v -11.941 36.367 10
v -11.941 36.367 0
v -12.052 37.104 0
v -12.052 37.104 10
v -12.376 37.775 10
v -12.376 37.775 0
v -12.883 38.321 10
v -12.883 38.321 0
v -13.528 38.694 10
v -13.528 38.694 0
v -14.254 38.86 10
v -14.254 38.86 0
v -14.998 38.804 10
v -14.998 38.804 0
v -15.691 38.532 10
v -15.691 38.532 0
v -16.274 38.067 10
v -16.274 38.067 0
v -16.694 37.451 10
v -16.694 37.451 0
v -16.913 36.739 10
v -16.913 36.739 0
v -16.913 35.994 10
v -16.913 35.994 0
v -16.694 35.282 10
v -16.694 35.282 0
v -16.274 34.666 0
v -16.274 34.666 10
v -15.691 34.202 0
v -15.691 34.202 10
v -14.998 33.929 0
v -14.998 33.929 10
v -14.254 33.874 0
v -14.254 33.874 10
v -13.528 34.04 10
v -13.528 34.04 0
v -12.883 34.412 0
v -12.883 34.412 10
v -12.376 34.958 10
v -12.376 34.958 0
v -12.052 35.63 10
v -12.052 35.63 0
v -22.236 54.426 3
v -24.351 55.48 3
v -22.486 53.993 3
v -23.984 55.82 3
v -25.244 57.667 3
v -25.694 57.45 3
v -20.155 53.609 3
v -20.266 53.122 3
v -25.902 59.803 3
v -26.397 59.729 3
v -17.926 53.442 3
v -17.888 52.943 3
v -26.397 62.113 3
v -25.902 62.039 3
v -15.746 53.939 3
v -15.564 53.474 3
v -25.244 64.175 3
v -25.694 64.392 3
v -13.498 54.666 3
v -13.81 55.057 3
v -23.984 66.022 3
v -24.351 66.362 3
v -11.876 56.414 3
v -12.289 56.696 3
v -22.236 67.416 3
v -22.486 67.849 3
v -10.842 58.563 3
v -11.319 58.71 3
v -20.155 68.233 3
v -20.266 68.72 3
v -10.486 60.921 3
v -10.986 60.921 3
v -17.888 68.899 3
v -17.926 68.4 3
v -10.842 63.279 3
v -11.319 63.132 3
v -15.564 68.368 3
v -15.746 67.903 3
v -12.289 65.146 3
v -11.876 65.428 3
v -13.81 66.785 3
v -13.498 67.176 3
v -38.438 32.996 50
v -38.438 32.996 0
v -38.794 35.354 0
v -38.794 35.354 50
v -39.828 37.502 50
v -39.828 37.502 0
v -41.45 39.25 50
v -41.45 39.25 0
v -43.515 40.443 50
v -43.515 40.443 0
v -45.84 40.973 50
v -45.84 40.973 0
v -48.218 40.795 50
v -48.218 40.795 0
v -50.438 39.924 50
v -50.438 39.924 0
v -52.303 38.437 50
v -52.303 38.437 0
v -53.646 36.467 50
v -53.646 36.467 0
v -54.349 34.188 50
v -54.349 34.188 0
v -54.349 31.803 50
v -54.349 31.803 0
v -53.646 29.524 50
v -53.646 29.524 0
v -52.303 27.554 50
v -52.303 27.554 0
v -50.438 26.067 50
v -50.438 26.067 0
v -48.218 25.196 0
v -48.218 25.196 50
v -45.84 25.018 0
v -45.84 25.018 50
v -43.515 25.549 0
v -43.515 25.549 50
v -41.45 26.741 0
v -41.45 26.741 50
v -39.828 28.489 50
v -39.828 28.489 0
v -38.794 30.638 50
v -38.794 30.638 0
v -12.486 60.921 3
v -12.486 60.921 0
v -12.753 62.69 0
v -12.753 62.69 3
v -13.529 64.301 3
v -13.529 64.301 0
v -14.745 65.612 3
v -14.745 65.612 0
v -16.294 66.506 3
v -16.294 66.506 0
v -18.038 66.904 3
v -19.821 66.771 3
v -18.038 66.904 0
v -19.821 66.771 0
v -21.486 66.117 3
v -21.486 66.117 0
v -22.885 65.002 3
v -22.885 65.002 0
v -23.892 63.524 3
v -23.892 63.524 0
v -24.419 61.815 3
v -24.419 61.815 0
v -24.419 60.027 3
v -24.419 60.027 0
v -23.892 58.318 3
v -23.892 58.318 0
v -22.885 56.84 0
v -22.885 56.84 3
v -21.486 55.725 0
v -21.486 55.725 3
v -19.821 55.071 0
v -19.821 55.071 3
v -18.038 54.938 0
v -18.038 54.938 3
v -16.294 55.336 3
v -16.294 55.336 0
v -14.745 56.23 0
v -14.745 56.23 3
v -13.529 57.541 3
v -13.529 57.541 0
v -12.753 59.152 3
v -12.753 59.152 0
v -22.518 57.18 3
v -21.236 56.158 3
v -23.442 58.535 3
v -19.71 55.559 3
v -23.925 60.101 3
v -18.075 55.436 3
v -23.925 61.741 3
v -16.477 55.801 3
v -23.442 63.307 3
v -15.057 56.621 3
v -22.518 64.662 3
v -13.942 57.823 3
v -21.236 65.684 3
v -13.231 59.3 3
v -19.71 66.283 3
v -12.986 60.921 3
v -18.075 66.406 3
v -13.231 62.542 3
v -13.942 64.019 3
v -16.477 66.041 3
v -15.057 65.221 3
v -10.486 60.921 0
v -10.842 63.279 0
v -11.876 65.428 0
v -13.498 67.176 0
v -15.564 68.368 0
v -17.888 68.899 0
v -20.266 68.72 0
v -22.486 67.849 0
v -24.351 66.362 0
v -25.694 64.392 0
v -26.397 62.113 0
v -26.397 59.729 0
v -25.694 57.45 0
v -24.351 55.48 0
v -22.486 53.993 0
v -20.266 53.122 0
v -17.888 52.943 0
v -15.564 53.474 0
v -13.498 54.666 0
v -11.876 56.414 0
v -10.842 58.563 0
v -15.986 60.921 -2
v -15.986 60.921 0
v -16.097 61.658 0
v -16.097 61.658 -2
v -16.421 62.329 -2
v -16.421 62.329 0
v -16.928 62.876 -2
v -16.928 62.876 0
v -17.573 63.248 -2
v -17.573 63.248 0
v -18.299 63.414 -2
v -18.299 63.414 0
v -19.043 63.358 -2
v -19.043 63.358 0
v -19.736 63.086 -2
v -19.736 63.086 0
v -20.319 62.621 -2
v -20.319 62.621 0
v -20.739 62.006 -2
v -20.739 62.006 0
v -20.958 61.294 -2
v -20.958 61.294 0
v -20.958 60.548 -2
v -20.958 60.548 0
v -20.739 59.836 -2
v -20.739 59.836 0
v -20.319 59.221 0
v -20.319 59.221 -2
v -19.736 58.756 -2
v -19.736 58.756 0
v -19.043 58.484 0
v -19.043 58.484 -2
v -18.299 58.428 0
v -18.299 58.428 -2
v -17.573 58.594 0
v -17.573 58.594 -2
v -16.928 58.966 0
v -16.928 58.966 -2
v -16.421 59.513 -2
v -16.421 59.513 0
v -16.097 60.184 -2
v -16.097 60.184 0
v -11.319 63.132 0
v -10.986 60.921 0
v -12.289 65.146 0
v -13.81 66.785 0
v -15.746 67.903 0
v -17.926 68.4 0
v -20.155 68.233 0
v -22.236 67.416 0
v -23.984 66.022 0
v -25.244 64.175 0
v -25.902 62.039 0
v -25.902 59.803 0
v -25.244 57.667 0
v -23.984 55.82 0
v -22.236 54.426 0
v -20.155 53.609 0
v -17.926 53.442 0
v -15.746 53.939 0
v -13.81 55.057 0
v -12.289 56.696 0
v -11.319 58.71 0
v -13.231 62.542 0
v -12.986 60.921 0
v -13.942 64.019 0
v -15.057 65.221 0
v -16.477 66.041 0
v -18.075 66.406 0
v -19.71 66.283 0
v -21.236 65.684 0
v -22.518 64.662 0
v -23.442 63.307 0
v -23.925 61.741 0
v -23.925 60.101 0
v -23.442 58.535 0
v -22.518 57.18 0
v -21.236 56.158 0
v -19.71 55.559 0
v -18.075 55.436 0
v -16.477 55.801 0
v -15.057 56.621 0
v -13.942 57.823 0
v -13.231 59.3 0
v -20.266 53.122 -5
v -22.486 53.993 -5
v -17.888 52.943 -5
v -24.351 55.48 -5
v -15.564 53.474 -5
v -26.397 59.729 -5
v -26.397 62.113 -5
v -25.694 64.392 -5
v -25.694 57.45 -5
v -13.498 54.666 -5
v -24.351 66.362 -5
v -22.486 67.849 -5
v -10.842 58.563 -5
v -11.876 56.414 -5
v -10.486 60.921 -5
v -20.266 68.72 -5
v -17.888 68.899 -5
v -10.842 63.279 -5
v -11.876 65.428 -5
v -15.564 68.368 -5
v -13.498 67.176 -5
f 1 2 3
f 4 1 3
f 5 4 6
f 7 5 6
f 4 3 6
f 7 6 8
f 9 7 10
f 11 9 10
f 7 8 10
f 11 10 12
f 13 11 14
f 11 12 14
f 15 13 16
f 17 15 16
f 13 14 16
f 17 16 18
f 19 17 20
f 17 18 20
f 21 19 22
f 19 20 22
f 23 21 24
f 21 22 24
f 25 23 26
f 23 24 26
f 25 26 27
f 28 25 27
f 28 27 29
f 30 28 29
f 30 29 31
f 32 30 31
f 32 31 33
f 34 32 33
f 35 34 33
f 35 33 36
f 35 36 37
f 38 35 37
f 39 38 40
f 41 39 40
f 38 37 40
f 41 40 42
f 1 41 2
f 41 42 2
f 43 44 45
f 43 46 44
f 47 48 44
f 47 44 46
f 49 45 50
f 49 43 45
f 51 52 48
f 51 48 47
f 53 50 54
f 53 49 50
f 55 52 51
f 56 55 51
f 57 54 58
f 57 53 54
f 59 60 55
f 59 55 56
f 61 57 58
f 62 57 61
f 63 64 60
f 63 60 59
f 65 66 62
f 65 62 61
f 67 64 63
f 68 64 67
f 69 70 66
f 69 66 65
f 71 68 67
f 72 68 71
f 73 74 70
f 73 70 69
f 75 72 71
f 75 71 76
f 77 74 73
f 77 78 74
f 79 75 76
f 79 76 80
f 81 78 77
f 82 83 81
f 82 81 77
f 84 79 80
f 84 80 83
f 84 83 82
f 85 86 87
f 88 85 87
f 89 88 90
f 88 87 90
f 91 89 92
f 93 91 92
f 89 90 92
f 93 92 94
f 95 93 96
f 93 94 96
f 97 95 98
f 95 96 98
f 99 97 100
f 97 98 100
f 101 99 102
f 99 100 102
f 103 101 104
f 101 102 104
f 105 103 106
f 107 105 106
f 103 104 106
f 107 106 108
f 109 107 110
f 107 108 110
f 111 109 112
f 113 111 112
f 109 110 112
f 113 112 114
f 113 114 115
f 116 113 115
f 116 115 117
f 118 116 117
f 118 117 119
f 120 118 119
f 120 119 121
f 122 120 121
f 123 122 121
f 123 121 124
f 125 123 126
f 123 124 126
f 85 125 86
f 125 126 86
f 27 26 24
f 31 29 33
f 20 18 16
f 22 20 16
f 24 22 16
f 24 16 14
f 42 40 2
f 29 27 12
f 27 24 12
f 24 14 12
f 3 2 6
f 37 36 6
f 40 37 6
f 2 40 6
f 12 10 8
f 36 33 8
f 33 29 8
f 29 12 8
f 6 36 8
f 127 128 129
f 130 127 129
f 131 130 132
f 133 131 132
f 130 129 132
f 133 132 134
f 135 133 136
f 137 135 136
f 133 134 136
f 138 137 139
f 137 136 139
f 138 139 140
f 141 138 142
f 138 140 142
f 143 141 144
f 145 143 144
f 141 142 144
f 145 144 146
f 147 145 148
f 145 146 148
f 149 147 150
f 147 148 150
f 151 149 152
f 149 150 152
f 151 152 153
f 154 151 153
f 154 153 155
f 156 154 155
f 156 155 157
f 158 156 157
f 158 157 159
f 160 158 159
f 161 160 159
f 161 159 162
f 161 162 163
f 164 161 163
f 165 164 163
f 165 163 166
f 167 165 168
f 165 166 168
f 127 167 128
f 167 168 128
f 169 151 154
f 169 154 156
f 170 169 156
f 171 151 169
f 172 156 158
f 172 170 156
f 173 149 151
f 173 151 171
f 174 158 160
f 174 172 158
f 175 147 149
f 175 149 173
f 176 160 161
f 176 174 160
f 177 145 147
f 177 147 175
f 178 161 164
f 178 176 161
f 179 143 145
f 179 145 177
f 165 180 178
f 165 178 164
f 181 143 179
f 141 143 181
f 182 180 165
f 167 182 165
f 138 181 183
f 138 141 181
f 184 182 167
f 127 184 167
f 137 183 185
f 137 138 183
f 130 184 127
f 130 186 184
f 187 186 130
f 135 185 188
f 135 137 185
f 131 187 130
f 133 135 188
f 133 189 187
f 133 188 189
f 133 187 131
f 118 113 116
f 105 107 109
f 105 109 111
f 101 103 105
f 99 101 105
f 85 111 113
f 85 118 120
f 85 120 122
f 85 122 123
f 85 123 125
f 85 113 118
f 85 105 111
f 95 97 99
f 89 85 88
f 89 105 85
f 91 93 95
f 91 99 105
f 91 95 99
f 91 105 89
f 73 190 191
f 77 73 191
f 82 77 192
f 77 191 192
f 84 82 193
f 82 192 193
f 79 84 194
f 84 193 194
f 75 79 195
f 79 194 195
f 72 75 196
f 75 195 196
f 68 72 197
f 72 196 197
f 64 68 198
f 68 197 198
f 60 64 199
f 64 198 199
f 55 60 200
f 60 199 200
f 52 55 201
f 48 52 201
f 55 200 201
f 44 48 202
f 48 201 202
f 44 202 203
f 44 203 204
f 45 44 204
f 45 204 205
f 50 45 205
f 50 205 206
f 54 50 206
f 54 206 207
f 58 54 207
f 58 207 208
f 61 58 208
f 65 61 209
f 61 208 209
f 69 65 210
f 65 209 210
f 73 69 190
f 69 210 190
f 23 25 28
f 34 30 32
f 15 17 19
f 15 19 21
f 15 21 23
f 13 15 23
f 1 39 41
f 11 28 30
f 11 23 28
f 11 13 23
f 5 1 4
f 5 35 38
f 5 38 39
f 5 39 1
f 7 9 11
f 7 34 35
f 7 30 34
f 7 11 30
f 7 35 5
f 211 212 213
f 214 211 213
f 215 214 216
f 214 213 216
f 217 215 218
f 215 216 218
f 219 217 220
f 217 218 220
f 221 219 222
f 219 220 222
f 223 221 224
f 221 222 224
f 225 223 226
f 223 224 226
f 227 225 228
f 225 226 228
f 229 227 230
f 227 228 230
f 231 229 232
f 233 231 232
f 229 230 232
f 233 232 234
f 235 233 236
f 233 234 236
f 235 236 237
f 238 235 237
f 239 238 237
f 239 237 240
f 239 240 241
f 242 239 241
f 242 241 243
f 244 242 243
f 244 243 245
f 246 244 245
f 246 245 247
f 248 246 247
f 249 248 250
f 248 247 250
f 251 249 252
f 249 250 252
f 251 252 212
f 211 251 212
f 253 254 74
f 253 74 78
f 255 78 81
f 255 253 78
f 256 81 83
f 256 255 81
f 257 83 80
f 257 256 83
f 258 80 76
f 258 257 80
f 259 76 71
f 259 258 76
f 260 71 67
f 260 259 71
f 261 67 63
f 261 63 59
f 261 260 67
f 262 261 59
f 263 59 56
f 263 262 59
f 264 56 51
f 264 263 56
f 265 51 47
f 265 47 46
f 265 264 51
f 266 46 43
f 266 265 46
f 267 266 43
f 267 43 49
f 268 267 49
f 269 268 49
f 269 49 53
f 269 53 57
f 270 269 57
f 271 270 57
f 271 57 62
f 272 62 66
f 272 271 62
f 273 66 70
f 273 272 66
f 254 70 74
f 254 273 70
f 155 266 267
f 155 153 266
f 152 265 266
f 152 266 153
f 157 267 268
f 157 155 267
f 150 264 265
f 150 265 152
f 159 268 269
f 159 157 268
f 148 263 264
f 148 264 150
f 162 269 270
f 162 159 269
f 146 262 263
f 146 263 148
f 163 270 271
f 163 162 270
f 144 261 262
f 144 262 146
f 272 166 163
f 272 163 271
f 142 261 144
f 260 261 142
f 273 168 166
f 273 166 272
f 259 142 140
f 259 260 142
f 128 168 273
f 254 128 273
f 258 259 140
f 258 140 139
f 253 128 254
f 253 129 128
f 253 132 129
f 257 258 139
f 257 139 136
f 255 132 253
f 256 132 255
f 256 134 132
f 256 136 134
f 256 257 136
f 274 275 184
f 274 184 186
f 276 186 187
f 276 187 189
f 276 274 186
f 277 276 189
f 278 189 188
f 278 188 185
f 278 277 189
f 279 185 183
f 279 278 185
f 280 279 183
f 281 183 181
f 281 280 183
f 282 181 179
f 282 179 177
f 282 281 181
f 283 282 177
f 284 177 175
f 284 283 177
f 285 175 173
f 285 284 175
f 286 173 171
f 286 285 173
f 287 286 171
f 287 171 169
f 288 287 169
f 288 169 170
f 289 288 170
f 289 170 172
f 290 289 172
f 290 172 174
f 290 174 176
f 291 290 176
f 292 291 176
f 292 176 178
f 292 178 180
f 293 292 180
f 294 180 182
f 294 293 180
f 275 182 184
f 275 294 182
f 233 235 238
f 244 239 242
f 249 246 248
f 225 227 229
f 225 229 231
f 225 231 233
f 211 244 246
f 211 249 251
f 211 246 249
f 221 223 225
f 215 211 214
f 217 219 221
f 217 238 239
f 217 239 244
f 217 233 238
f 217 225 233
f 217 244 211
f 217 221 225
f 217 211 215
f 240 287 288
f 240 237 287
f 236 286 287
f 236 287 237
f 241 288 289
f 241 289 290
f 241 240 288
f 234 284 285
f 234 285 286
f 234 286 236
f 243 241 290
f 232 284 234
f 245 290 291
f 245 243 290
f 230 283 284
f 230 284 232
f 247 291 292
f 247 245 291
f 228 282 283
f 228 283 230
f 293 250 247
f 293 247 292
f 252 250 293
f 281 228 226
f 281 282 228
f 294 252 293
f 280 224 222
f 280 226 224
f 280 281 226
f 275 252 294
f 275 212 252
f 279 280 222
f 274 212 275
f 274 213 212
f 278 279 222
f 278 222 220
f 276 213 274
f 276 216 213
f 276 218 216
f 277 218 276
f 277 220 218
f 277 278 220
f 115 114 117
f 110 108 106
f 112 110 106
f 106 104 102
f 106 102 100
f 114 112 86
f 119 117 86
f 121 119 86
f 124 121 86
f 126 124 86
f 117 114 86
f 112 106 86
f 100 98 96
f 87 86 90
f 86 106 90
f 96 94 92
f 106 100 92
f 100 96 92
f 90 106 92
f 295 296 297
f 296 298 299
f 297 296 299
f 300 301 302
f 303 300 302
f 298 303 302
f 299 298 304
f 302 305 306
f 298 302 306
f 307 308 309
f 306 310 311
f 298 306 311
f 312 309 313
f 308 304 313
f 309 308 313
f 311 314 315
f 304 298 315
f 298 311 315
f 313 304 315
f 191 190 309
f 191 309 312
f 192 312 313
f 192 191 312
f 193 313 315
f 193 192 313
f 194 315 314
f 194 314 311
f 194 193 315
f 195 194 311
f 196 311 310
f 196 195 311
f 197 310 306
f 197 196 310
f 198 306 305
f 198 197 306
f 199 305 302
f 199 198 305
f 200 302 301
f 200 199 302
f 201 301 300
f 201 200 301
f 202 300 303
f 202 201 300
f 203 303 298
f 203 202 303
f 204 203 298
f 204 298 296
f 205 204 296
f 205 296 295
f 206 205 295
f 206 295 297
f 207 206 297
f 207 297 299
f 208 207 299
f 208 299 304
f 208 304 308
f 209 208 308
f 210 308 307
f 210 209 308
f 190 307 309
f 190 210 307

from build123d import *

# Parameters (mm, degrees)
F0_R     = 8
F1_DEPTH = 50
F2_R     = 8
F2_R_2   = 7.5
F2_R_3   = 6
F2_R_4   = 5.5
F2_R_5   = 2.5
F3_DEPTH = 5
F4_DEPTH = 3
F5_DEPTH = 2
F6_R     = 2.5
F7_DEPTH = 10


with BuildPart() as f1:
    # F0 (on Top) → F1 (new body)
    with BuildSketch(Plane.XY):
        with Locations((-46.4382022619, 32.9955667257)):
            Circle(F0_R)
    extrude(amount=F1_DEPTH)


with BuildPart() as f3:
    # F2 (on Top) → F3 (new body)
    with BuildSketch(Plane.XY):
        with Locations((-18.4862352908, 60.9209723771)):
            Circle(F2_R)
        with Locations((-18.4862352908, 60.9209723771)):
            Circle(F2_R_2, mode=Mode.SUBTRACT)
        with Locations((-18.4862352908, 60.9209723771)):
            Circle(F2_R_2)
        with Locations((-18.4862352908, 60.9209723771)):
            Circle(F2_R_3, mode=Mode.SUBTRACT)
        with Locations((-18.4862352908, 60.9209723771)):
            Circle(F2_R_3)
        with Locations((-18.4862352908, 60.9209723771)):
            Circle(F2_R_4, mode=Mode.SUBTRACT)
        with Locations((-18.4862352908, 60.9209723771)):
            Circle(F2_R_4)
        with Locations((-18.4862352908, 60.9209723771)):
            Circle(F2_R_5, mode=Mode.SUBTRACT)
        with Locations((-18.4862352908, 60.9209723771)):
            Circle(F2_R_5)
    extrude(amount=-F3_DEPTH)

    # F2 (on Top) → F4 (join)
    with BuildSketch(Plane.XY):
        with Locations((-18.4862352908, 60.9209723771)):
            Circle(F2_R)
        with Locations((-18.4862352908, 60.9209723771)):
            Circle(F2_R_2, mode=Mode.SUBTRACT)
        with Locations((-18.4862352908, 60.9209723771)):
            Circle(F2_R_3)
        with Locations((-18.4862352908, 60.9209723771)):
            Circle(F2_R_4, mode=Mode.SUBTRACT)
    extrude(amount=F4_DEPTH)

    # F2 (on Top) → F5 (cut)
    with BuildSketch(Plane.XY):
        with Locations((-18.4862352908, 60.9209723771)):
            Circle(F2_R_5)
    extrude(amount=-F5_DEPTH, mode=Mode.SUBTRACT)


with BuildPart() as f7:
    # F6 (on Top) → F7 (new body)
    with BuildSketch(Plane.XY):
        with Locations((-14.4413039088, 36.3667160273)):
            Circle(F6_R)
    extrude(amount=F7_DEPTH)


solid = Compound([f1.part, f3.part, f7.part])
